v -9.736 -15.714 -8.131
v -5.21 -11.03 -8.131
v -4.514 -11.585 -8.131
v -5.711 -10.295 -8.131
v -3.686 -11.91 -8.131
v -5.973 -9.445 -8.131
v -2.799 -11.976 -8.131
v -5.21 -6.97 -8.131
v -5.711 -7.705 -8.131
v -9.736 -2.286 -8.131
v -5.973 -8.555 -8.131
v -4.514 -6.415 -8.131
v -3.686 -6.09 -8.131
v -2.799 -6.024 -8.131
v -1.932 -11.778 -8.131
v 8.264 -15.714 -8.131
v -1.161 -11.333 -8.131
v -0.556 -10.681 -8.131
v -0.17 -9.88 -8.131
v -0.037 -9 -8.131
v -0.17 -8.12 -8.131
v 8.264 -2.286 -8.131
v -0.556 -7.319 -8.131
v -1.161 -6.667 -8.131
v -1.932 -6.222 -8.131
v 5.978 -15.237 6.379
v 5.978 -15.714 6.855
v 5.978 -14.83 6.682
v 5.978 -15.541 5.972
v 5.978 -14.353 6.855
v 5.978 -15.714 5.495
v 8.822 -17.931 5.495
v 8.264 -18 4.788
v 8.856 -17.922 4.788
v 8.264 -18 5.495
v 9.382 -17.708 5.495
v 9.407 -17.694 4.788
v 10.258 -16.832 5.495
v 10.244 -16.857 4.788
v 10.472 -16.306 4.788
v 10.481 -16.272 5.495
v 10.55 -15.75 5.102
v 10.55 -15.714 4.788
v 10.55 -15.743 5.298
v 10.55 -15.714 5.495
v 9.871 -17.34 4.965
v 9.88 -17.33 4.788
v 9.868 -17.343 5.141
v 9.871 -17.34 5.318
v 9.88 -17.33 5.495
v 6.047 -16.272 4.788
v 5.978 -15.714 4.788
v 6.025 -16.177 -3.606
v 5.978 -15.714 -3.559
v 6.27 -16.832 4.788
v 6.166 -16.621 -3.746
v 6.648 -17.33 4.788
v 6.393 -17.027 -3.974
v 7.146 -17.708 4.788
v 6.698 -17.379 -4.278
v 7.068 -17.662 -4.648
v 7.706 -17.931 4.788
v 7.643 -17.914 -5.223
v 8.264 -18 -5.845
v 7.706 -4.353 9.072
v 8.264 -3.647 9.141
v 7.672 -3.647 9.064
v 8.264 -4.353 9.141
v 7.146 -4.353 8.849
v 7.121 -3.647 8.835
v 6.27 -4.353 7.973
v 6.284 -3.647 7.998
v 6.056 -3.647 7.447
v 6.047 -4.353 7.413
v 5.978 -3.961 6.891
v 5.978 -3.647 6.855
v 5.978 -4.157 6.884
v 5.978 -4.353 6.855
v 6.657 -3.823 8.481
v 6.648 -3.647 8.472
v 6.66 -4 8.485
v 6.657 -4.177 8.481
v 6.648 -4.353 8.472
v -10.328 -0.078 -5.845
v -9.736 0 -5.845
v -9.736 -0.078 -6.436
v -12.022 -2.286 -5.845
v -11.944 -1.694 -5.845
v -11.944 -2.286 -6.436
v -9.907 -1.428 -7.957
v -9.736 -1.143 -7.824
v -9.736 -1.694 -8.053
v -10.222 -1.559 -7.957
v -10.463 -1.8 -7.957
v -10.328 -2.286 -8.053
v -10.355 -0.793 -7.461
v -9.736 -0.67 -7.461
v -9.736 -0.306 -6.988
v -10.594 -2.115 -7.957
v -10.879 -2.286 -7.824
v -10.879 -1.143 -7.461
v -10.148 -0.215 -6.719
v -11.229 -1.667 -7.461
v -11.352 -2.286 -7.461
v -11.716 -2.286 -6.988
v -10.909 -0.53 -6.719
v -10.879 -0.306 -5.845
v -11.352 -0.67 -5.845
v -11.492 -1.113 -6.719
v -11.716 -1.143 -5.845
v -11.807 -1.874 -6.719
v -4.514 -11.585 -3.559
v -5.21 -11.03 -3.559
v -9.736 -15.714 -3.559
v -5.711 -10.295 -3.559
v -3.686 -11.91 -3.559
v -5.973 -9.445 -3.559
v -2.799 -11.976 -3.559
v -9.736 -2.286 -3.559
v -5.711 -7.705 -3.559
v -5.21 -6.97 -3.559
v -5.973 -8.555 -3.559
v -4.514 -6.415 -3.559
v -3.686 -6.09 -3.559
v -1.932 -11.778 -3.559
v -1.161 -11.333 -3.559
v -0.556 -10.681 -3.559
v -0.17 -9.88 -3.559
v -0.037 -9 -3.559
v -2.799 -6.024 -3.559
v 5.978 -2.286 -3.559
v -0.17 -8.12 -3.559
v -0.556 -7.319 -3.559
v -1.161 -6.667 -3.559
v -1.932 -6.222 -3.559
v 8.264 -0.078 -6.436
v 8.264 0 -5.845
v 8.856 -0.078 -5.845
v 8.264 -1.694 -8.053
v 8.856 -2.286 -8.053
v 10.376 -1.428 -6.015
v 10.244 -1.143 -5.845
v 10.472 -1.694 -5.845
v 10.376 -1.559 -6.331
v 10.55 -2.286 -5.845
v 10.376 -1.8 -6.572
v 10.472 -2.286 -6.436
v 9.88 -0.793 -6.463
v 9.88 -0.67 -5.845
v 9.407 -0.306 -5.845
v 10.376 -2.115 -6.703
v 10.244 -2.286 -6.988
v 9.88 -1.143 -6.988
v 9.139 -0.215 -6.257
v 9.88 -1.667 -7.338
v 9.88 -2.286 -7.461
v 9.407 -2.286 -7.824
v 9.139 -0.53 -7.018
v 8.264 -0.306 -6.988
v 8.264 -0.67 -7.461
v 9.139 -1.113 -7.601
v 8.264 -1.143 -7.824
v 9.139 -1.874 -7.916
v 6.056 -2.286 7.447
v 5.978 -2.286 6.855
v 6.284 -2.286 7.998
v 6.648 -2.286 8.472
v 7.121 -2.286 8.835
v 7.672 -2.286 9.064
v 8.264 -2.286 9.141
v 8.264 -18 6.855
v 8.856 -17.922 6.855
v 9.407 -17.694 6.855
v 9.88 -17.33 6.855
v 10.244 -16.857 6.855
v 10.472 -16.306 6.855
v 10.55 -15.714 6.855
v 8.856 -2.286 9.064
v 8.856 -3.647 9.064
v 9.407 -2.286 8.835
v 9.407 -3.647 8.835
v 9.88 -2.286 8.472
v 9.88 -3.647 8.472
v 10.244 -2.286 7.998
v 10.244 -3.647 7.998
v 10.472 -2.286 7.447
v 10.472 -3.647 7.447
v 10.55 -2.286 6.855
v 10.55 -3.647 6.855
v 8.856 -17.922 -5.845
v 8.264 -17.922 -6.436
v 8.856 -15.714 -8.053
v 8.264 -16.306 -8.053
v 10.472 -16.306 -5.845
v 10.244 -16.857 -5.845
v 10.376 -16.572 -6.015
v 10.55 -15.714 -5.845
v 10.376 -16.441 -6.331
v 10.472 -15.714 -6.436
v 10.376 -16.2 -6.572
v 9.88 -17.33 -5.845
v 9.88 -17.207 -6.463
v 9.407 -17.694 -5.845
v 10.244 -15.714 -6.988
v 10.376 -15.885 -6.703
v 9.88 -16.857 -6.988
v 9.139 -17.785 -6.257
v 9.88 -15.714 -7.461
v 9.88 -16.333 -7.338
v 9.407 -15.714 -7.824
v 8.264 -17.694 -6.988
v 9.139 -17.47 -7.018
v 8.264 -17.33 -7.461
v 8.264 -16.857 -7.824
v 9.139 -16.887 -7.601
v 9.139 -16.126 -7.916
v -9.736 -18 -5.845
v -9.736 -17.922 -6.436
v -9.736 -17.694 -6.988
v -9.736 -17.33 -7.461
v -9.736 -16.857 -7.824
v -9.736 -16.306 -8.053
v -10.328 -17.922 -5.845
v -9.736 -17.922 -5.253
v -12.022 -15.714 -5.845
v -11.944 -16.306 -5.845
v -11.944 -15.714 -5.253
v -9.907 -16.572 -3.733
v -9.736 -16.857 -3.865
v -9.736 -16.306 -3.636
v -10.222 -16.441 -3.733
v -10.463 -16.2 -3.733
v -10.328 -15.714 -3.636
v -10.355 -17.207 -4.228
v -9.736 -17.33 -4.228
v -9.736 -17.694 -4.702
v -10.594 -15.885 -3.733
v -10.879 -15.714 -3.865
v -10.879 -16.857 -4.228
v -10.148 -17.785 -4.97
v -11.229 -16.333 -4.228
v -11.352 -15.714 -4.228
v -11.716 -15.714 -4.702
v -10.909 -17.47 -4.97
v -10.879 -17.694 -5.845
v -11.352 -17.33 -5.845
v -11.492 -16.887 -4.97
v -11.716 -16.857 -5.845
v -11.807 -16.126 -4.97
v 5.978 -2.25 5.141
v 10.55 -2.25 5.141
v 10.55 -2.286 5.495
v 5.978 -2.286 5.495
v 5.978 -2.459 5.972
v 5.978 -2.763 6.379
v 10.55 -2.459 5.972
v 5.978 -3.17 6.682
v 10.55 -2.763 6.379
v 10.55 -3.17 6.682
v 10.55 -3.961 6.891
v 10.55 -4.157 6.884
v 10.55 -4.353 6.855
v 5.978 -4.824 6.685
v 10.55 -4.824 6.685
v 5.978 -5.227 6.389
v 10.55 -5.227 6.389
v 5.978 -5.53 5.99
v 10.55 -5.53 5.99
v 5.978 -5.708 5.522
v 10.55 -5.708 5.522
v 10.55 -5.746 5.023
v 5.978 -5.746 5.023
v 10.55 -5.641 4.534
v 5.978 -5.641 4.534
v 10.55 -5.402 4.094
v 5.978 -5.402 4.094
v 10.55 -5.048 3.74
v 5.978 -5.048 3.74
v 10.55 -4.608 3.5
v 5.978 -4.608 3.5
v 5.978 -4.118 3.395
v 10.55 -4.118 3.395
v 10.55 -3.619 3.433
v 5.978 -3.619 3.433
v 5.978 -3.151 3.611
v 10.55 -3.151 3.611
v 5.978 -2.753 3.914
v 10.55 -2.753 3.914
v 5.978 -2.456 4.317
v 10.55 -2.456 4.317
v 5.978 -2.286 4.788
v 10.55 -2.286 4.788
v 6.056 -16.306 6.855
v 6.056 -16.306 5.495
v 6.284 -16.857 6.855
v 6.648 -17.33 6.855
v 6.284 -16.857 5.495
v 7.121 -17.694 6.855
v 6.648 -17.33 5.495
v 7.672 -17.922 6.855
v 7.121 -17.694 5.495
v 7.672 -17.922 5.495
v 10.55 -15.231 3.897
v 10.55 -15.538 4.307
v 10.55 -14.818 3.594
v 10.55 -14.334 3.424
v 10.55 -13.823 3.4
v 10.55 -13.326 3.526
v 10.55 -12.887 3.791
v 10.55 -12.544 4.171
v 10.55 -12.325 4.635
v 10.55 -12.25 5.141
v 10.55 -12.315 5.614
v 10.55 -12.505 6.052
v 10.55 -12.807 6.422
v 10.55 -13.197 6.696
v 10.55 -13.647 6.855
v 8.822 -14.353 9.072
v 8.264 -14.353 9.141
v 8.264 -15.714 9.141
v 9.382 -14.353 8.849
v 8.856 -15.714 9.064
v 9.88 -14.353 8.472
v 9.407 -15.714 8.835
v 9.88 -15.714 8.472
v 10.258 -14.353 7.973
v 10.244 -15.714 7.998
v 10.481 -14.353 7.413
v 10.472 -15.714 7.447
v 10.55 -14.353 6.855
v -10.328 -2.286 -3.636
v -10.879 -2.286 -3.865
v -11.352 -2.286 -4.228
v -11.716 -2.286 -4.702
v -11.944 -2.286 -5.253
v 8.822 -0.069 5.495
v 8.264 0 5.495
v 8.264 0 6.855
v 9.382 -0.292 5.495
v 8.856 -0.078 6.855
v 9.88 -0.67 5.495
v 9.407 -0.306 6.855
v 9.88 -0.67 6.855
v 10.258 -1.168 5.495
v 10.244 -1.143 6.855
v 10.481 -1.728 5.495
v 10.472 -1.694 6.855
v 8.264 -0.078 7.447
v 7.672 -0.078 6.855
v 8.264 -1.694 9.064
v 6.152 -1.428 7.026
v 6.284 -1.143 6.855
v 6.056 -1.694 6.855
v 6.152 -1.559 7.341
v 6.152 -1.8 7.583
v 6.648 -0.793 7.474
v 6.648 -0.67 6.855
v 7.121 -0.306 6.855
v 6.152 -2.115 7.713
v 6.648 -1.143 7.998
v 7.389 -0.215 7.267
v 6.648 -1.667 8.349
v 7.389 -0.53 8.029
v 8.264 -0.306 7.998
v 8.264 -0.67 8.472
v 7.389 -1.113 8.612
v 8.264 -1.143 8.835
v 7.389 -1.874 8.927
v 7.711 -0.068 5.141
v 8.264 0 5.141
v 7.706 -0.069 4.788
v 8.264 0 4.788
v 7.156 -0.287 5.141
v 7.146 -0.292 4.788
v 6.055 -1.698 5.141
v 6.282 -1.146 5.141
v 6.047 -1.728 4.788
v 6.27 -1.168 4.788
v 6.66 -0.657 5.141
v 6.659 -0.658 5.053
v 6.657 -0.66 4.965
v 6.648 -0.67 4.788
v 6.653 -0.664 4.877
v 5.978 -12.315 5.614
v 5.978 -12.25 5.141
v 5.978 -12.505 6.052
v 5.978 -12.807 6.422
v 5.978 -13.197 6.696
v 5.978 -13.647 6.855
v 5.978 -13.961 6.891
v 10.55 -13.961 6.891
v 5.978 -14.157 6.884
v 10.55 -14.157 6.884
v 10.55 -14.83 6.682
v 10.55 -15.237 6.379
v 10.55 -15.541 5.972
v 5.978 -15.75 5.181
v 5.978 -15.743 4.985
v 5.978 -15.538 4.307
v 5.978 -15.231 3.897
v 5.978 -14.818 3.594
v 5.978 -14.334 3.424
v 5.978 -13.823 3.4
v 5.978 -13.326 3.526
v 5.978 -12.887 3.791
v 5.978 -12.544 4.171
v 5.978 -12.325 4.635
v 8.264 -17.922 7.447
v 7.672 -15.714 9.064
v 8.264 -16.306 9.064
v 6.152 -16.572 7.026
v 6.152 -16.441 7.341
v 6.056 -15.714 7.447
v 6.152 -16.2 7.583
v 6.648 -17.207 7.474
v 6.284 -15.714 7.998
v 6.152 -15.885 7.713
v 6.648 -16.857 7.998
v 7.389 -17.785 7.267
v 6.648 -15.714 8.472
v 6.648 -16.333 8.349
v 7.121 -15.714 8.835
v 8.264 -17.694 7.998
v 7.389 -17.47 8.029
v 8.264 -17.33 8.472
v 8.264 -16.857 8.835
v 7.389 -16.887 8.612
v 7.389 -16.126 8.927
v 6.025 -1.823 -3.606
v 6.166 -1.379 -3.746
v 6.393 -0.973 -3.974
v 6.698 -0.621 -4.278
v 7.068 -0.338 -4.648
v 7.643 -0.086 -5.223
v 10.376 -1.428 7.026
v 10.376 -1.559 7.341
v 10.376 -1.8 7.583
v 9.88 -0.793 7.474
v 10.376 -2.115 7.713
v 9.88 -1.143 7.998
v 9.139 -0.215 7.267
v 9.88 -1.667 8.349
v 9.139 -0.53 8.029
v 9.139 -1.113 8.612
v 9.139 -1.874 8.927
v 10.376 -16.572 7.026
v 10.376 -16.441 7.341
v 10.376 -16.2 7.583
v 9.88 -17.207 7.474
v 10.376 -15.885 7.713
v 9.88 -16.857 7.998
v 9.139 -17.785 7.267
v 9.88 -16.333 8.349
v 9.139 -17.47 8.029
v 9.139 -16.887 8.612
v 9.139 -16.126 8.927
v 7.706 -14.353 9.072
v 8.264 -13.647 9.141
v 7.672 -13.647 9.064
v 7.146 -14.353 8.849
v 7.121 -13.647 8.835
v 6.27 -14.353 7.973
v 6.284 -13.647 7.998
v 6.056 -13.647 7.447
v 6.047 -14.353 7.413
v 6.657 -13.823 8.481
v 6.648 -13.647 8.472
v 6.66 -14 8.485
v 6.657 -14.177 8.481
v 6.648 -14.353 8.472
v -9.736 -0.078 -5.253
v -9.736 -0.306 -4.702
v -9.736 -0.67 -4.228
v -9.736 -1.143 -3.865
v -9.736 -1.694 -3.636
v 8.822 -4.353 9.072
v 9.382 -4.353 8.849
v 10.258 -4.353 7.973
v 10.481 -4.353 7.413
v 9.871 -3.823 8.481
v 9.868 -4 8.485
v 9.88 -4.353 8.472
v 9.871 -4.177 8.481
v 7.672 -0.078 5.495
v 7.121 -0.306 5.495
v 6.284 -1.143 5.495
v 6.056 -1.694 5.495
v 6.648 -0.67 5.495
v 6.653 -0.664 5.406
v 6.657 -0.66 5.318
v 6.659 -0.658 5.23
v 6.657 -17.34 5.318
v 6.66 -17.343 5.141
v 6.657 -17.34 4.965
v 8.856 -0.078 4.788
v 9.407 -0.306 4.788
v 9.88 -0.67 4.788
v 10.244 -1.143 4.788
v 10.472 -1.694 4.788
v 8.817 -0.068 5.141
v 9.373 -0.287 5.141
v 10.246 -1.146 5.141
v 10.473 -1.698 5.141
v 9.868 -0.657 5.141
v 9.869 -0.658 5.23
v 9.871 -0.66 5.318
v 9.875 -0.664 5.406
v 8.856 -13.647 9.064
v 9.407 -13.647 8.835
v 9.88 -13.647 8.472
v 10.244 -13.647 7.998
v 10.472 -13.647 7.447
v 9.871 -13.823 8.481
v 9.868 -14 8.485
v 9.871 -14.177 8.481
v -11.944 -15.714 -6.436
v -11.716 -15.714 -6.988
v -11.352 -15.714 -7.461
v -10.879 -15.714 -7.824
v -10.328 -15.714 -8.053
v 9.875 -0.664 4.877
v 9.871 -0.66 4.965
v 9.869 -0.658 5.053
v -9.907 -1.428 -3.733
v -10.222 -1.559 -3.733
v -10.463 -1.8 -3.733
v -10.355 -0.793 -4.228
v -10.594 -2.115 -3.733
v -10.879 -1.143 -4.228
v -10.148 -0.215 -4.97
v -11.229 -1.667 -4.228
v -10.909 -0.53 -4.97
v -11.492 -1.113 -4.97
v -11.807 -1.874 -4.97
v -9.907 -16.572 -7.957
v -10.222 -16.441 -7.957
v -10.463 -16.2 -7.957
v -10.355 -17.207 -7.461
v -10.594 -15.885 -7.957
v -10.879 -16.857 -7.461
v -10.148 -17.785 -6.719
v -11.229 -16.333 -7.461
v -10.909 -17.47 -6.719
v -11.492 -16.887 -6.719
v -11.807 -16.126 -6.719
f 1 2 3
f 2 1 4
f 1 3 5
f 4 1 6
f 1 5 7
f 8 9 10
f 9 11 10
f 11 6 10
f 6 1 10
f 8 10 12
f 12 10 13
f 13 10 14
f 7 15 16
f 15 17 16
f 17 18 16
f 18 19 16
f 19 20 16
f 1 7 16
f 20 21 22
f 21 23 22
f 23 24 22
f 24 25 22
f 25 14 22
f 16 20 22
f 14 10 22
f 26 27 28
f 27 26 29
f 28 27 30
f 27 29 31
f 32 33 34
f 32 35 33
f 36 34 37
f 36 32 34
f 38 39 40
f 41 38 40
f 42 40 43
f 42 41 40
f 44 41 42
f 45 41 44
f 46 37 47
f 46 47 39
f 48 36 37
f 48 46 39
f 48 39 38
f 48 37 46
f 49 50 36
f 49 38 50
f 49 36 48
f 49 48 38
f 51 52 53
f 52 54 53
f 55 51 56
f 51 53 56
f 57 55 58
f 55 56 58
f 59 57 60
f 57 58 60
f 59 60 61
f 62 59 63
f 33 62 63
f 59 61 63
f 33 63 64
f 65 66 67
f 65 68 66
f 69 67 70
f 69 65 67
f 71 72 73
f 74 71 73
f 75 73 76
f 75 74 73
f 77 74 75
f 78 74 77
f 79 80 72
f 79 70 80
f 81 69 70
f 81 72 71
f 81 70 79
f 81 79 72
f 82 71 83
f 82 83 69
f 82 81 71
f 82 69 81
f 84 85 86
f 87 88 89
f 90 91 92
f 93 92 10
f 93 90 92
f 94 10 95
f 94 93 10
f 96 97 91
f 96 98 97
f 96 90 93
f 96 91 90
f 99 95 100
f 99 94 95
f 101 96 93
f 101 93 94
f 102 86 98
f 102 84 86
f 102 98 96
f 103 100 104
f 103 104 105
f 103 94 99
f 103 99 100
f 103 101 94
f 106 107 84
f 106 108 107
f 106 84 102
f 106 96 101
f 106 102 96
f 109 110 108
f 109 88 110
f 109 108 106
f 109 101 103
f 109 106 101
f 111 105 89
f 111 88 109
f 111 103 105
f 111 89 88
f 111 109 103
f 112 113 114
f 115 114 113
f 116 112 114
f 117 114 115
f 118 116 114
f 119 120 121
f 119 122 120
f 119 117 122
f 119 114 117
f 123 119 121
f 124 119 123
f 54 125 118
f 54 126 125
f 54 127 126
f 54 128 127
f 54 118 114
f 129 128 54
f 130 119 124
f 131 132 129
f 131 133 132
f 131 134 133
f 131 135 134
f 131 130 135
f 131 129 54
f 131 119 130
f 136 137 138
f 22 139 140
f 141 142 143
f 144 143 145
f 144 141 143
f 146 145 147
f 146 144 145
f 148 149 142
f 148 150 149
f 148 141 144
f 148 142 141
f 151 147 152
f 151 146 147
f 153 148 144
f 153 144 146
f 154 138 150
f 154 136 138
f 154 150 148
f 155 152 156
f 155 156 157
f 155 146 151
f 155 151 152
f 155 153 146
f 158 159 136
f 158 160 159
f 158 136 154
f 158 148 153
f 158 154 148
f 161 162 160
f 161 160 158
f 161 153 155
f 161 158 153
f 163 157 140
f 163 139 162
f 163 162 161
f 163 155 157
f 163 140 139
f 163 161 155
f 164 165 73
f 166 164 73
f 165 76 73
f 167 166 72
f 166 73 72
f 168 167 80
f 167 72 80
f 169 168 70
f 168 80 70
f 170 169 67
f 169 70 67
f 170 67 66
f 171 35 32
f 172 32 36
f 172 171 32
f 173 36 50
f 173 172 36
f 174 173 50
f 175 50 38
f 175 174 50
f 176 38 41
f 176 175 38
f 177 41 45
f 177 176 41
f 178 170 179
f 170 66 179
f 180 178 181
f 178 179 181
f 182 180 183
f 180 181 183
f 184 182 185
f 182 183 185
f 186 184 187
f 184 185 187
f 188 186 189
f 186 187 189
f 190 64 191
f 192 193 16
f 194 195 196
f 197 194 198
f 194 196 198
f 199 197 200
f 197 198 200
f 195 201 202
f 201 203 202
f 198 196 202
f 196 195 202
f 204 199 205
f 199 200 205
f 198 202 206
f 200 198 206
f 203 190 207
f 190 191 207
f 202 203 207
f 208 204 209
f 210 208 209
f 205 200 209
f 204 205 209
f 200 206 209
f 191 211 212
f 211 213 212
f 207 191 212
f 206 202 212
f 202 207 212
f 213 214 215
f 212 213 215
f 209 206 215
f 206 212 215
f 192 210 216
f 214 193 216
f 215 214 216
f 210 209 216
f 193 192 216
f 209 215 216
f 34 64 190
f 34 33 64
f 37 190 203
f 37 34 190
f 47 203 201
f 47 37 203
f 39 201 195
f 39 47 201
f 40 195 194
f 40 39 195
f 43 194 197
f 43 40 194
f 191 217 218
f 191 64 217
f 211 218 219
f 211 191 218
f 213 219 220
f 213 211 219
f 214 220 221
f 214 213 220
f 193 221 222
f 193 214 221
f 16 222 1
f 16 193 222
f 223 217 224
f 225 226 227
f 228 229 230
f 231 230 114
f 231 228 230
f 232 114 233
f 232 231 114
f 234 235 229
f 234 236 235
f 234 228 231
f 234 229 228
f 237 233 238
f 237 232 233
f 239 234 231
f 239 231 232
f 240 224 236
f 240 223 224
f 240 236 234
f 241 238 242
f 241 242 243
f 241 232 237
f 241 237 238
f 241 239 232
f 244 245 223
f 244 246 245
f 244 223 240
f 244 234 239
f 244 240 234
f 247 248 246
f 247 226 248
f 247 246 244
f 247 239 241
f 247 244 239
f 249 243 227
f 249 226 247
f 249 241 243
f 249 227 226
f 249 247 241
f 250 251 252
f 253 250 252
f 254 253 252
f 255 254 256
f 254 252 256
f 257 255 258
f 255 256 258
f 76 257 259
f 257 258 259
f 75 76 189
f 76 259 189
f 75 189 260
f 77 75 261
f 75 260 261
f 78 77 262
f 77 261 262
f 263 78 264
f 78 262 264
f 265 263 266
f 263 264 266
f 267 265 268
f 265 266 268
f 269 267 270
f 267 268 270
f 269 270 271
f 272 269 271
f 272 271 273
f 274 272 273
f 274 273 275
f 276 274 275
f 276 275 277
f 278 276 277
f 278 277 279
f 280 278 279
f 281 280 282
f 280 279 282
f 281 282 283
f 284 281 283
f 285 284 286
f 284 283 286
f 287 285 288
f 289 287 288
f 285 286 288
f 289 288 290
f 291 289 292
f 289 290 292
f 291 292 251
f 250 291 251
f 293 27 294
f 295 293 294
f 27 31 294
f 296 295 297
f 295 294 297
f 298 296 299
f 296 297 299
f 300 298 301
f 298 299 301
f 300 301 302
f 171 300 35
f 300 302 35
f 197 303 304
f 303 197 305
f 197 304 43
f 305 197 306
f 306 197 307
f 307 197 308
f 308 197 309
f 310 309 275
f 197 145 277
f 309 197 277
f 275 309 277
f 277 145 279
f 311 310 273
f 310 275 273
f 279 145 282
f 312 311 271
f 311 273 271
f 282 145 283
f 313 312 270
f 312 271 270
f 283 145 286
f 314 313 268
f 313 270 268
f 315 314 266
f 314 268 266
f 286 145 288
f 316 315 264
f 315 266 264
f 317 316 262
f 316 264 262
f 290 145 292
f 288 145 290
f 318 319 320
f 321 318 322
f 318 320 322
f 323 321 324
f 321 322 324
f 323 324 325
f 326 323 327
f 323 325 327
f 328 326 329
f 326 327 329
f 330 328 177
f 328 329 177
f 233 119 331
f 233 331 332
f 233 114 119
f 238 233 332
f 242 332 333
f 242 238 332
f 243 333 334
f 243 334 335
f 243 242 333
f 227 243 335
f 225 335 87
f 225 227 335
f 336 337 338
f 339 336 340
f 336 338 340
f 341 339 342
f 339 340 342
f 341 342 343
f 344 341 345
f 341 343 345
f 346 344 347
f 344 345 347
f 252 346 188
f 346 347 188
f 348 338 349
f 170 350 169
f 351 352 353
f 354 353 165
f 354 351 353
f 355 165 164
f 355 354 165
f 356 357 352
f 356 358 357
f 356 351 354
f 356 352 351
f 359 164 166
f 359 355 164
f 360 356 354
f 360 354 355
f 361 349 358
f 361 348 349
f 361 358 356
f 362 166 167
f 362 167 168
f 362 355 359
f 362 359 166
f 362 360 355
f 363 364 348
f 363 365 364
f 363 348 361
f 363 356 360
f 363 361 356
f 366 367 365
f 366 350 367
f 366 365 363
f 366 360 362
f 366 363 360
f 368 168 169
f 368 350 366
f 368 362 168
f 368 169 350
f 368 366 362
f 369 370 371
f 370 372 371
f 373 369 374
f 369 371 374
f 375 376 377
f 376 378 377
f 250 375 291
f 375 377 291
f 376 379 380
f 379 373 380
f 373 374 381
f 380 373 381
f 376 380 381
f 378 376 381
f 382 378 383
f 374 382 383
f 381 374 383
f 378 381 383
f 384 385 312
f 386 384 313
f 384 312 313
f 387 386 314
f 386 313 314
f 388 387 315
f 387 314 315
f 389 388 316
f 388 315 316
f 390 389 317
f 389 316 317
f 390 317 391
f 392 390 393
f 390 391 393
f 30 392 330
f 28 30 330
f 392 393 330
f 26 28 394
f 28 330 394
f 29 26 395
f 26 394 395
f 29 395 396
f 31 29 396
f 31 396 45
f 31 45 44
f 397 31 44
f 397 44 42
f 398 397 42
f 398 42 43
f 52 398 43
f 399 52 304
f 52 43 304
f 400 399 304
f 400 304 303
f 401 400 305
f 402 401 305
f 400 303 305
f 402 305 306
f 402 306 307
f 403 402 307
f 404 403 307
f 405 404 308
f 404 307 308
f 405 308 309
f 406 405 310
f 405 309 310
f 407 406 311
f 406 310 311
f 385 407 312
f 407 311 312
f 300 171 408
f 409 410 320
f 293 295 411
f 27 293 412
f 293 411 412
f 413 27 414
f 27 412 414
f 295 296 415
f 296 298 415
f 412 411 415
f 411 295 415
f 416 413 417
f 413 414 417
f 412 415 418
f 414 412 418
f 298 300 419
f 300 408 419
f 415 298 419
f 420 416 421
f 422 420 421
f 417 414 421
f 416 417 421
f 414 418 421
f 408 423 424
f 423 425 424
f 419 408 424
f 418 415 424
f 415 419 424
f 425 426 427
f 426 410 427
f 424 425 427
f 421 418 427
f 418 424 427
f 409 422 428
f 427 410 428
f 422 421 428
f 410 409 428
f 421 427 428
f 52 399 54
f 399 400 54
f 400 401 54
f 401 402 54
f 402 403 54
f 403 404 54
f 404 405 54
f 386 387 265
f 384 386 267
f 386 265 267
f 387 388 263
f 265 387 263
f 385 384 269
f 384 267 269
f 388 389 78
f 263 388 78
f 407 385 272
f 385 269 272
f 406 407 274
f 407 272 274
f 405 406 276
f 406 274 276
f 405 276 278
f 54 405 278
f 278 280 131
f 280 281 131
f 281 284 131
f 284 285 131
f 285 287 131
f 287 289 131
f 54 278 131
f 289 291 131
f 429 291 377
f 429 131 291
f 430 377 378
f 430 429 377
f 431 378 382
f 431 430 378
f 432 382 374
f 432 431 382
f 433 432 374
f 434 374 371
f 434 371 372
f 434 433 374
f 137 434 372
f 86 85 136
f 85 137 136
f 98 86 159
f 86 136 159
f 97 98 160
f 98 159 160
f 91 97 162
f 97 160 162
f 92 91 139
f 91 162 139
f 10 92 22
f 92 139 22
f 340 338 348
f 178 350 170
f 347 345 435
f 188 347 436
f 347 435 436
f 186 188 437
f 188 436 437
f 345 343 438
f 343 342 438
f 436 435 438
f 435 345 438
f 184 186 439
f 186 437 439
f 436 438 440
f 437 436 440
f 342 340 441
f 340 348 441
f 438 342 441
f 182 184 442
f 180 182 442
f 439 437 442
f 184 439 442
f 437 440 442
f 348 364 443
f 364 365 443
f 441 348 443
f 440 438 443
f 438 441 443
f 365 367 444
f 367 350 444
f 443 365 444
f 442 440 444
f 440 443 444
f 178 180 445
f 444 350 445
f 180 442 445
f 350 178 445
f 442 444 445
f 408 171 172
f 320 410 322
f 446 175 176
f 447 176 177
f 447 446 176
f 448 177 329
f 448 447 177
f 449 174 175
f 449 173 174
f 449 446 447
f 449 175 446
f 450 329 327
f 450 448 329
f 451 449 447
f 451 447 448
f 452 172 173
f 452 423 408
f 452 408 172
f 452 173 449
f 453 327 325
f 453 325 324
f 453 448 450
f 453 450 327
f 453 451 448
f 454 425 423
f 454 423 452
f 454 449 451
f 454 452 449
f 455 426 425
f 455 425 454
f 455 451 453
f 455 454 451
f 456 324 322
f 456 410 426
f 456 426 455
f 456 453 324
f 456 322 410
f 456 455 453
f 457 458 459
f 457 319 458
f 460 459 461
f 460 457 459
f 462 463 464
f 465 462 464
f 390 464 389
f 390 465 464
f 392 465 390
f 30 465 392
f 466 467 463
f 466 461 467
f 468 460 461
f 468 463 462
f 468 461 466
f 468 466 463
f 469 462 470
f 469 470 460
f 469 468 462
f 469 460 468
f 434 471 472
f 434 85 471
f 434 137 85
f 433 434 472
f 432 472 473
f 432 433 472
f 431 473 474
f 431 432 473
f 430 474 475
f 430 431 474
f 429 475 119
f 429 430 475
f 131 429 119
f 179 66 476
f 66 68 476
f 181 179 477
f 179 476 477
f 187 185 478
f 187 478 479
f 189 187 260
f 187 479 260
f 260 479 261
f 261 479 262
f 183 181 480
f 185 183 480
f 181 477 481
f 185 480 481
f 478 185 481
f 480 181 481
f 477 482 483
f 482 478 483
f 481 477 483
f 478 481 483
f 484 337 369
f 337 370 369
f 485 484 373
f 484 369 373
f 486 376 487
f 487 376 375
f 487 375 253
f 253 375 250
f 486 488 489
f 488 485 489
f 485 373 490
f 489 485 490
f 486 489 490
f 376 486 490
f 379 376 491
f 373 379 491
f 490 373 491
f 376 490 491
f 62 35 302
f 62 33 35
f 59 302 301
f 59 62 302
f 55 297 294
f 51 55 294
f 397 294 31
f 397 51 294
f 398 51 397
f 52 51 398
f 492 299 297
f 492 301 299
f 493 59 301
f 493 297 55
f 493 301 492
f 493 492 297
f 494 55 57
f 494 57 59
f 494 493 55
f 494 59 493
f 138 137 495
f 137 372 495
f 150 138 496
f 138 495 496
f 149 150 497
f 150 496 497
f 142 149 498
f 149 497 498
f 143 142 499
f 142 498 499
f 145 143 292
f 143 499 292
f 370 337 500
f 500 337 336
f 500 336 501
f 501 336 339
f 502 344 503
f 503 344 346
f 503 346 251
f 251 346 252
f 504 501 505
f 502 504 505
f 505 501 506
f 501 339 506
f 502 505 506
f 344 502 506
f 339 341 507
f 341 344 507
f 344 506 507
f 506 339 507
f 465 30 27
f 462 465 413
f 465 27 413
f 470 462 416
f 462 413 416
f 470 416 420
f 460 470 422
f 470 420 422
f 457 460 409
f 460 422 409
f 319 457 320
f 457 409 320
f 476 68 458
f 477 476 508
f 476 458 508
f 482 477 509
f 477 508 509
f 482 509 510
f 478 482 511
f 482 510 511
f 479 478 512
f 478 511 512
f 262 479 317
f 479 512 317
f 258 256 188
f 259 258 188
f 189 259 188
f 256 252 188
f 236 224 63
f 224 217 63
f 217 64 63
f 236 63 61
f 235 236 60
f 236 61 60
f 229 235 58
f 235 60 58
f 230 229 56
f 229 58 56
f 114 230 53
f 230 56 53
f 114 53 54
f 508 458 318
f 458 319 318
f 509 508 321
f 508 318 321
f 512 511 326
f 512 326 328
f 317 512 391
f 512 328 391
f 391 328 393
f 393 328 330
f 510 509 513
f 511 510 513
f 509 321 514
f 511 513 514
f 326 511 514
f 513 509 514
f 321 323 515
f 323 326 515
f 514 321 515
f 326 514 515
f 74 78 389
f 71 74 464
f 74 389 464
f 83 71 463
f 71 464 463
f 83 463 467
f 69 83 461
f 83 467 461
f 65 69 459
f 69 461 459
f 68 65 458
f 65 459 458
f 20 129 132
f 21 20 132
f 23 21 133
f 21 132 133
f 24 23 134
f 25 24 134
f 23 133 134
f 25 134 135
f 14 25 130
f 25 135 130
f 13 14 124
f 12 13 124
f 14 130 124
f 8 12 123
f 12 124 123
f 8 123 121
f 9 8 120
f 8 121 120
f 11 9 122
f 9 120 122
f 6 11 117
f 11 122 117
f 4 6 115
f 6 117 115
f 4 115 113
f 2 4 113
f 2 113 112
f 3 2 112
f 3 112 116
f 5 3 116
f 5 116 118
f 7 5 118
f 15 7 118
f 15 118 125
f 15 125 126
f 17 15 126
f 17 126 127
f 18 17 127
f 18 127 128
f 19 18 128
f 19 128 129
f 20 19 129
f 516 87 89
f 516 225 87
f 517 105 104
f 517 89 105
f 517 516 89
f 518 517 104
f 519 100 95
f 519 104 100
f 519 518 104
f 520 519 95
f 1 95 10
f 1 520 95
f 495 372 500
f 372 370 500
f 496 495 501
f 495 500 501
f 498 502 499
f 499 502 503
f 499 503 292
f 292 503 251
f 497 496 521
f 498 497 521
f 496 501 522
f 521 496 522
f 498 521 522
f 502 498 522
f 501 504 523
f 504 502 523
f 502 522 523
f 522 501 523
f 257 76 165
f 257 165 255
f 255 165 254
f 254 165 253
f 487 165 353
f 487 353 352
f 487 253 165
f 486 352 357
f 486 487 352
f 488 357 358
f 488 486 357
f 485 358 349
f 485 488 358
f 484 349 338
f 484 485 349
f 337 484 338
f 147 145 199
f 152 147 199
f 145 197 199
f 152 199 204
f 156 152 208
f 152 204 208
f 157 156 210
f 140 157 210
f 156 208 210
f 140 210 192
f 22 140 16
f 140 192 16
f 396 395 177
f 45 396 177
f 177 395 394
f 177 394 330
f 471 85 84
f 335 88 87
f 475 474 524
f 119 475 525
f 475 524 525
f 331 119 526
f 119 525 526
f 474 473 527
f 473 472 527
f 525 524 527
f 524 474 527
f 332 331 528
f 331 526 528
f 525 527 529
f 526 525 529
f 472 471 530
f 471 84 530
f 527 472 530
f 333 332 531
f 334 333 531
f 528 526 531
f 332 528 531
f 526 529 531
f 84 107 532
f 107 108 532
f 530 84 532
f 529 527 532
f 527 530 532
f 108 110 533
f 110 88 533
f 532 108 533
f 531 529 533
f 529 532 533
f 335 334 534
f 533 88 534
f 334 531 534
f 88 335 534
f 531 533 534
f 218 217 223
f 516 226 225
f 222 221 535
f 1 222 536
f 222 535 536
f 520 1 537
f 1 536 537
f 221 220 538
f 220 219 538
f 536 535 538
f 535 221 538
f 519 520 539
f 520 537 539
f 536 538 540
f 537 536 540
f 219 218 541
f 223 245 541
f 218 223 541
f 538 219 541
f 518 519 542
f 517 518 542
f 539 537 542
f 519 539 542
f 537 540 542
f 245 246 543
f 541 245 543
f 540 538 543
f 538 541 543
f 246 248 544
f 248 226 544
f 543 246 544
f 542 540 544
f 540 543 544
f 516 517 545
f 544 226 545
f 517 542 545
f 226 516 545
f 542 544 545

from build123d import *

# Parameters (mm, degrees)
F0_W     = 18
F0_H     = 4.572
F1_DEPTH = 18
F2_R     = 2.9845
F3_DEPTH = 25.4
F4_R     = 1.75
F5_DEPTH = 25.4
F6_R     = 2.28599


# Not quite as in the source:
# - a fillet or chamfer is up to 0.001 mm smaller than in the source, because OpenCascade refuses the exact size


with BuildPart() as f1:
    # F0 (on Front) → F1 (new body)
    with BuildSketch(Plane.XZ):
        Polygon((5.9780351967, 9.1414450236), (5.9780351967, -3.5585549764), (5.9780351967, -8.1305549764), (10.5500351967, -8.1305549764), (10.5500351967, 9.1414450236), align=None)
        with Locations((-3.0219648033, -5.8445549764)):
            Rectangle(F0_W, F0_H)
    extrude(amount=F1_DEPTH)

    # F2 (on face) → F3 (cut)
    with BuildSketch(Plane.XY.offset(-3.5585549764)):
        with Locations((-3.0219648033, -9)):
            Circle(F2_R)
    extrude(amount=-F3_DEPTH, mode=Mode.SUBTRACT)

    # F4 (on face) → F5 (cut)
    with BuildSketch(Plane.YZ.offset(10.5500351967)):
        with Locations((-14, 5.1414450236)):
            Circle(F4_R)
        with Locations((-4, 5.1414450236)):
            Circle(F4_R)
    extrude(amount=-F5_DEPTH, mode=Mode.SUBTRACT)

    # F6 (radius 2.286 in the source; OpenCascade refuses exactly that, so slightly less here)
    f6_edges = [f1.edges().sort_by_distance(p)[0] for p in [
        (8.264035, -18, 9.141445),
        (8.264035, 0, 9.141445),
        (-12.021965, -18, -5.844555),
        (-12.021965, 0, -5.844555),
        (5.978035, -18, 2.791445),
        (-3.021965, -18, -3.558555),
        (-0.735965, -18, -8.130555),
        (10.550035, -18, 0.505445),
        (5.978035, 0, 2.791445),
        (-3.021965, 0, -3.558555),
        (-0.735965, 0, -8.130555),
        (10.550035, 0, 0.505445),
        (-12.021965, -9, -3.558555),
        (-12.021965, -9, -8.130555),
        (10.550035, -9, -8.130555),
        (10.550035, -9, 9.141445),
        (5.978035, -9, 9.141445),
    ]]
    fillet(f6_edges, radius=F6_R)


solid = f1.part
